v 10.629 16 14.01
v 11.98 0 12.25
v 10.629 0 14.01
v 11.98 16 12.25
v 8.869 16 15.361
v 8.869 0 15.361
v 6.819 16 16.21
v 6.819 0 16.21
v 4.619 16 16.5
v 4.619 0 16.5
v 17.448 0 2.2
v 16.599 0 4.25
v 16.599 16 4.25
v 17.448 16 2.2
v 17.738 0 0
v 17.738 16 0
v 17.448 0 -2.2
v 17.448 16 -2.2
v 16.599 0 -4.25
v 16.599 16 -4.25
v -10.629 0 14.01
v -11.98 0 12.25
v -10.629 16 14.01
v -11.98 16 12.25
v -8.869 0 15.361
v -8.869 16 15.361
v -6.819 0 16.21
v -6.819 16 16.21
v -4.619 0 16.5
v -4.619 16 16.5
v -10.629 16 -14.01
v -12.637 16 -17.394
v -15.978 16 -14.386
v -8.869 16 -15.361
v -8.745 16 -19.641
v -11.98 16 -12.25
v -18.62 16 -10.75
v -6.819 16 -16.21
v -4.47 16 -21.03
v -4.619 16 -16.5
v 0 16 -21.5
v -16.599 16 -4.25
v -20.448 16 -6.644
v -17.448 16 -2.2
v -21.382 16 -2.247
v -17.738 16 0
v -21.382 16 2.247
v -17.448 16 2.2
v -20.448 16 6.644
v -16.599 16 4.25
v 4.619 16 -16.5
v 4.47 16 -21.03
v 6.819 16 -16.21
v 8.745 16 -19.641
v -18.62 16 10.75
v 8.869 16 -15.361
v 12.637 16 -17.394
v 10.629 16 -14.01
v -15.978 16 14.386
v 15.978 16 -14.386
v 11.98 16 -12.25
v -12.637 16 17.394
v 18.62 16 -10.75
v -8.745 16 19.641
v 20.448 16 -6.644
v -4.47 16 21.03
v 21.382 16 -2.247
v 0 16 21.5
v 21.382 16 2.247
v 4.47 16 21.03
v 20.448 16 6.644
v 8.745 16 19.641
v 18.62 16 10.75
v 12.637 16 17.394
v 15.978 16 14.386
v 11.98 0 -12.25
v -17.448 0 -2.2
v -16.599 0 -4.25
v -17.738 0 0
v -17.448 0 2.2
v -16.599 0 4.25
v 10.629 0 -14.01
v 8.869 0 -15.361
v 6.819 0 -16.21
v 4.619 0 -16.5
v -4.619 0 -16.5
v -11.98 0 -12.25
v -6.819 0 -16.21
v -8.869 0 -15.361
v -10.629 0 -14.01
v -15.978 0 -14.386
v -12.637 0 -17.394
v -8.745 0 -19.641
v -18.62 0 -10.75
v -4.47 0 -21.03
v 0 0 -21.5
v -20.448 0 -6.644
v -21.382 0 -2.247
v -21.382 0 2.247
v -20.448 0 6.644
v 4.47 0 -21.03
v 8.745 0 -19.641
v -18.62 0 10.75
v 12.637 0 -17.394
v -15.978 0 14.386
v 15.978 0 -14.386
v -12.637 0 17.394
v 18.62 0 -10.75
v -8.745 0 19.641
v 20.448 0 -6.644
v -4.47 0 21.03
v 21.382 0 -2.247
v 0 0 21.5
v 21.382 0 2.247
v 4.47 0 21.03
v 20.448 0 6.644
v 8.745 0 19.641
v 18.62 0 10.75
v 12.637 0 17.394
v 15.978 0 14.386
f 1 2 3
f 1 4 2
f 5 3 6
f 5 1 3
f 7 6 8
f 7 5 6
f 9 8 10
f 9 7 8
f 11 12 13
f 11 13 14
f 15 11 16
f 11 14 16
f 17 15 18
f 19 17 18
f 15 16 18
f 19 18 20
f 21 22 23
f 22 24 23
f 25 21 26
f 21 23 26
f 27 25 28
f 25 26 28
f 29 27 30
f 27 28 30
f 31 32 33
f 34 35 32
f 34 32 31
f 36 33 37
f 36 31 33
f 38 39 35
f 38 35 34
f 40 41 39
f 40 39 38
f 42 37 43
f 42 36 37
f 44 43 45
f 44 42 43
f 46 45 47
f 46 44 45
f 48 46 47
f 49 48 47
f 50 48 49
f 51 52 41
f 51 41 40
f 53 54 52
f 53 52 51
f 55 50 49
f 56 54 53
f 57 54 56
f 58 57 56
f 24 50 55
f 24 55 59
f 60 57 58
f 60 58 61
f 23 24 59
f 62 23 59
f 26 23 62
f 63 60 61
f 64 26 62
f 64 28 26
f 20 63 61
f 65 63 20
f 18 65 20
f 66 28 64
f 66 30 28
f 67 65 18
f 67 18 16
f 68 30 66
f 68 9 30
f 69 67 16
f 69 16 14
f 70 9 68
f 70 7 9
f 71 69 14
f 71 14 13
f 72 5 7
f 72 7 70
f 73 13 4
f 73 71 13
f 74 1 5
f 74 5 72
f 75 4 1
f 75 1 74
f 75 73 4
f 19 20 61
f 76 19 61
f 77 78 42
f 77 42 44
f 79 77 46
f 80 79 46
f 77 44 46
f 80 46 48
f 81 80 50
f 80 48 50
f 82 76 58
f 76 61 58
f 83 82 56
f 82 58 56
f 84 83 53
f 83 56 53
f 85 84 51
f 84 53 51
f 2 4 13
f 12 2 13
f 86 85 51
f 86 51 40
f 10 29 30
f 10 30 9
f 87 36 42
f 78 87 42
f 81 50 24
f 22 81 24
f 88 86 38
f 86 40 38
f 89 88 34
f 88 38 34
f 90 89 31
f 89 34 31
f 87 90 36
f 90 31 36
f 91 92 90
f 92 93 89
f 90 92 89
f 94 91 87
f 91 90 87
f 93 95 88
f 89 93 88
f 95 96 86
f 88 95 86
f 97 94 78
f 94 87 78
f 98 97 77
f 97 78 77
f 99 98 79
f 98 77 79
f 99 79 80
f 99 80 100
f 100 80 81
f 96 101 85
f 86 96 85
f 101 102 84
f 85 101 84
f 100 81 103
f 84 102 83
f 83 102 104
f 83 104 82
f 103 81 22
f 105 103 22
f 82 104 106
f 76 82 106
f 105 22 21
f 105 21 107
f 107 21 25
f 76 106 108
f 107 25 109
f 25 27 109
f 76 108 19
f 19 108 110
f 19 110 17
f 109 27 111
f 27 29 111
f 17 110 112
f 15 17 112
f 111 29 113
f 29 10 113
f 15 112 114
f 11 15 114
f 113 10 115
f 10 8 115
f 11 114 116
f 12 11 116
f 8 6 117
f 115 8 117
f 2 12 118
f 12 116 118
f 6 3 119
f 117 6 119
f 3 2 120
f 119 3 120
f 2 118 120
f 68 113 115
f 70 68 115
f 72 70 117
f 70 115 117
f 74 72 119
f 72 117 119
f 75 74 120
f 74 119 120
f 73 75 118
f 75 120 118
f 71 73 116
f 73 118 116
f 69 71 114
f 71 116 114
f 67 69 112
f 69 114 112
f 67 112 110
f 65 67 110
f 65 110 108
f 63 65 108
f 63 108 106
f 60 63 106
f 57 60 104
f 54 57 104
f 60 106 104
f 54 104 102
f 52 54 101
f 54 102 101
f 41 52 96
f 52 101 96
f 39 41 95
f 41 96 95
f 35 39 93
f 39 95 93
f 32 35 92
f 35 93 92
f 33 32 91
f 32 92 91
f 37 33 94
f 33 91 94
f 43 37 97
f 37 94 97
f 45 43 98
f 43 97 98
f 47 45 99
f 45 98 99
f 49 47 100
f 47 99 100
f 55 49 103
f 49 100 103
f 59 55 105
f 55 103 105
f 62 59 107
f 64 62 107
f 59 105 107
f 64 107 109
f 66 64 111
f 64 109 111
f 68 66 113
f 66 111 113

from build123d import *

# Parameters (mm, degrees)
SKETCH_1_R      = 21.5
EXTRUDE_1_DEPTH = 16
FILLET_1_R      = 8.5


with BuildPart() as part:
    # 草图1 → 凸台-拉伸1 (new body)
    with BuildSketch(Plane(origin=(0, 0, 0), x_dir=(1, 0, 0), z_dir=(0, 1, 0))):
        with Locations(Location((0, 0, 0), (0, 0, 270))):
            Circle(SKETCH_1_R)
        Polygon((9.526279442, -16.5), (19.052558883, 0), (9.526279442, 16.5), (-9.526279442, 16.5), (-19.052558883, 0), (-9.526279442, -16.5), align=None, mode=Mode.SUBTRACT)
    extrude(amount=EXTRUDE_1_DEPTH)

    # 圆角1
    fillet_1_edges = [part.edges().sort_by_distance(p)[0] for p in [
        (9.526279442, 8, 16.5),
        (19.052558883, 8, 0),
        (9.526279442, 8, -16.5),
        (-9.526279442, 8, -16.5),
        (-19.052558883, 8, 0),
        (-9.526279442, 8, 16.5),
    ]]
    fillet(fillet_1_edges, radius=FILLET_1_R)


solid = part.part
